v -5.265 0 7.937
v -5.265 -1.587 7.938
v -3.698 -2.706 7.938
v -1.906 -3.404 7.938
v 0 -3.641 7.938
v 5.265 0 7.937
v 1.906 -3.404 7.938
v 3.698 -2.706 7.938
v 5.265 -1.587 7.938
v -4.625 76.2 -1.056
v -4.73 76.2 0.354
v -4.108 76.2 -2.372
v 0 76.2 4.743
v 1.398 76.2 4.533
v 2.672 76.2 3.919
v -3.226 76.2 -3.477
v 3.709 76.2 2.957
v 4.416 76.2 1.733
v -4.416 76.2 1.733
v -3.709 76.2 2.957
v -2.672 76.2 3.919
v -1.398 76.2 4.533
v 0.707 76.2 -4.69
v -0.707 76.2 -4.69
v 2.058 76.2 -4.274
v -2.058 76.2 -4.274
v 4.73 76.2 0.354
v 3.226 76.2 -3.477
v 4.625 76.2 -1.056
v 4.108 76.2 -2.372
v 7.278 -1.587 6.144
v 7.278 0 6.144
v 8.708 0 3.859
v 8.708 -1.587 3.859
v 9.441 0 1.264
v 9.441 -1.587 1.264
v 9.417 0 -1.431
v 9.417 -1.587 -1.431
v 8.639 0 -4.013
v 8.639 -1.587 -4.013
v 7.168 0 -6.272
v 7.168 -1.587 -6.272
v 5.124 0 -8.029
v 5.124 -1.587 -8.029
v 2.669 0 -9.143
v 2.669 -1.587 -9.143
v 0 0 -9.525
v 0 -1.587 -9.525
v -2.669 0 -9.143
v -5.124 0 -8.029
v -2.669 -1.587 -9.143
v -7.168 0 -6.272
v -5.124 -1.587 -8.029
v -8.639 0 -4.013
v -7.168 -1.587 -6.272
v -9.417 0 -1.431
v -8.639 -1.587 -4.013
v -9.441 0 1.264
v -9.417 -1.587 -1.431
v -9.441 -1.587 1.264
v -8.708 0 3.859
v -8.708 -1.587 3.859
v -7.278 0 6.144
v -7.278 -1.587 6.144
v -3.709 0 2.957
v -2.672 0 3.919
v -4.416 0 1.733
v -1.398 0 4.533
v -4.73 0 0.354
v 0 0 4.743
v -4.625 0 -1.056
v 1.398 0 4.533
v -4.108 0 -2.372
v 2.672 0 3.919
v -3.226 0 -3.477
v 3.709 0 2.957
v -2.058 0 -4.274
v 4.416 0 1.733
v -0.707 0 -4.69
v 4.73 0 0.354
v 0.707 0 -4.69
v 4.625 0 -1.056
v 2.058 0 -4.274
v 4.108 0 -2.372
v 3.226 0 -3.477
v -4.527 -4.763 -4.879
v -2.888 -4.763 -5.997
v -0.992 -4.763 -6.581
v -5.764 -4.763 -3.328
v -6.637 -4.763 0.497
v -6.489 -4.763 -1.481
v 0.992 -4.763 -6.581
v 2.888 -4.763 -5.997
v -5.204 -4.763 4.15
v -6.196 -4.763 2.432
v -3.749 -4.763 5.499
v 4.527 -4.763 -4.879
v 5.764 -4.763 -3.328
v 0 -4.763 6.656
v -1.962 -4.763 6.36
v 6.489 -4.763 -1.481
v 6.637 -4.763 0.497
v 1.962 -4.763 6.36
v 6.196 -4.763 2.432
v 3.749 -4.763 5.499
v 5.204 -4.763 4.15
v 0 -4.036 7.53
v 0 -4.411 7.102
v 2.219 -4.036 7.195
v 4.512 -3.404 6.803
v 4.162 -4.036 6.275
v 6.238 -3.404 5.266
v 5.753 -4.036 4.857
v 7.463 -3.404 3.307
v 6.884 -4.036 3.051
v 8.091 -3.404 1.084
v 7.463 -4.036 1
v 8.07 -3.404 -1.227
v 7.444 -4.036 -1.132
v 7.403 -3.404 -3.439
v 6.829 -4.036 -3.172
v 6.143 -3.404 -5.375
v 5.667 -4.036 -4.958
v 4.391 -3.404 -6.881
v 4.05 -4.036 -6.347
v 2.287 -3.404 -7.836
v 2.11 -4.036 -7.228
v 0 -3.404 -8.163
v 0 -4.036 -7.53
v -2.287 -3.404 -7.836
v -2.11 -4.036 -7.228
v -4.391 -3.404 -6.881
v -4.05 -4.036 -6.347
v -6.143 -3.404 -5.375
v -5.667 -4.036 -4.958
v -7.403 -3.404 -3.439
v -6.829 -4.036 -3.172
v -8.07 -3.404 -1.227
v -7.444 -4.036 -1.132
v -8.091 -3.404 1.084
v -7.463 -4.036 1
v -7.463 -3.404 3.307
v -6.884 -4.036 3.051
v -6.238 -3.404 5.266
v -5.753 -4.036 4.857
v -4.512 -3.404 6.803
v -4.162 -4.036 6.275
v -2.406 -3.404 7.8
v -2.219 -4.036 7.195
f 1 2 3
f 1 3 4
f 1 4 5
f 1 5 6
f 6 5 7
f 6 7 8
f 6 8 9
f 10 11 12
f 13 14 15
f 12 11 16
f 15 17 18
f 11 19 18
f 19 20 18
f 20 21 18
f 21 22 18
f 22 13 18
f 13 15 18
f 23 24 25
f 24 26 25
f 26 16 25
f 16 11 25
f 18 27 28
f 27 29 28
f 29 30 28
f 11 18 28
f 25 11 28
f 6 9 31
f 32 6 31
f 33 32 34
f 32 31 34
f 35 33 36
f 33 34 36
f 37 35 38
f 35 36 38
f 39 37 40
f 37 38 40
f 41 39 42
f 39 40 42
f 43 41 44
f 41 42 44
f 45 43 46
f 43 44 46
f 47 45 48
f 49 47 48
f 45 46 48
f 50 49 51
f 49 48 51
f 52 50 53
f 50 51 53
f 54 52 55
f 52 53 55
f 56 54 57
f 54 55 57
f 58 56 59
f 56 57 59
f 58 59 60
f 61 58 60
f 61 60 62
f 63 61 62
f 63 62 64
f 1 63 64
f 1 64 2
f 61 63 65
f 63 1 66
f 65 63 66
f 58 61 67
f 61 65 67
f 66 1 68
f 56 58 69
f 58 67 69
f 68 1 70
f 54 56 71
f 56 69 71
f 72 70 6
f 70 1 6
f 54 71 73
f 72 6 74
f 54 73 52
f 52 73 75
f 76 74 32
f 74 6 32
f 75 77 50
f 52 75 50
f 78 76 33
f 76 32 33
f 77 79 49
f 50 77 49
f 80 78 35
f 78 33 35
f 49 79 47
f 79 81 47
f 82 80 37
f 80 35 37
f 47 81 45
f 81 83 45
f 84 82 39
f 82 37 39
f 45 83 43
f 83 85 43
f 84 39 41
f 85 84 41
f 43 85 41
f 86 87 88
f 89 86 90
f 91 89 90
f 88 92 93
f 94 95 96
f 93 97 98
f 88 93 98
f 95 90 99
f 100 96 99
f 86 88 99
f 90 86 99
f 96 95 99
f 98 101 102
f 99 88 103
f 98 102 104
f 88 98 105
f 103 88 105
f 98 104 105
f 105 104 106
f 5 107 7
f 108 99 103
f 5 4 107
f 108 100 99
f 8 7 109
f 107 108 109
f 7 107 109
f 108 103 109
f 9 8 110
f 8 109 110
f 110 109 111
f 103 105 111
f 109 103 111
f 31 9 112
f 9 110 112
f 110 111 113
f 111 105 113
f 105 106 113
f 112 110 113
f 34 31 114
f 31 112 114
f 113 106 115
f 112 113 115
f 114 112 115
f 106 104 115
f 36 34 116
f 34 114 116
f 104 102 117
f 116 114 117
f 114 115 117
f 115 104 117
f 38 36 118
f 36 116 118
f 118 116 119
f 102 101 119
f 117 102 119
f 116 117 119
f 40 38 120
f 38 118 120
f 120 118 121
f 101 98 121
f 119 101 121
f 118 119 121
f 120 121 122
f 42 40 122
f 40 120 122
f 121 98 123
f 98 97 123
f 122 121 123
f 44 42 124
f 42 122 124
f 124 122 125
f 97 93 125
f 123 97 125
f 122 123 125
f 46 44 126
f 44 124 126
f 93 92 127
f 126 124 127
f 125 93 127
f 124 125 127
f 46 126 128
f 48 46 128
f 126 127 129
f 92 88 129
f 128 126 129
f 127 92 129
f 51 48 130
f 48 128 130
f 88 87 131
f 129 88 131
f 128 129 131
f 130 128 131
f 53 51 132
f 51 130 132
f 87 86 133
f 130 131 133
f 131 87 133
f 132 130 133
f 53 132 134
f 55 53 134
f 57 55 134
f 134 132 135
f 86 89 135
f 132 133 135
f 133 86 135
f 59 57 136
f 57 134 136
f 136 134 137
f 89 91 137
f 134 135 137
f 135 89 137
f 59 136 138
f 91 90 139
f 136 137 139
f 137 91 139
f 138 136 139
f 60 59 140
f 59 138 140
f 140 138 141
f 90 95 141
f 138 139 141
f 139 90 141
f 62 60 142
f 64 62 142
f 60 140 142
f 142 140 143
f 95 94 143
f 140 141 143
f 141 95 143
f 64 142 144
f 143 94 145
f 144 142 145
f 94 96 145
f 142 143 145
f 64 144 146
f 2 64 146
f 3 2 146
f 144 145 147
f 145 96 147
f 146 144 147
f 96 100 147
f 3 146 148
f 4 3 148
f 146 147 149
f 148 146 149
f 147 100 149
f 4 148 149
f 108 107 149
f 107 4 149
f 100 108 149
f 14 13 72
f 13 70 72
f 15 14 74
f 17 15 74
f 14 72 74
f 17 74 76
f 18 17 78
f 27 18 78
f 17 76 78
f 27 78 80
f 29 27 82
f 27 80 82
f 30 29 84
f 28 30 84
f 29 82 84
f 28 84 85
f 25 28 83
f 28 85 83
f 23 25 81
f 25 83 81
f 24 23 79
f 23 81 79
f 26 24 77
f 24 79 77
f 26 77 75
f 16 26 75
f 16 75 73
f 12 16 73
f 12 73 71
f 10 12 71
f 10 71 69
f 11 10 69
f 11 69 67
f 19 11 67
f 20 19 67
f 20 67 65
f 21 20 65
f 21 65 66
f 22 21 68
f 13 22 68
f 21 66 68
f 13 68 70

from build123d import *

# Parameters (mm, degrees)
F3_DEPTH = 4.7625


with BuildPart() as f1:
    # F0 (on Right) → F1 (revolve)
    with BuildSketch(Plane.YZ):
        with BuildLine():
            Line((-1.5875, 0), (0, 0))
            Line((0, 0), (76.2, 0))
            Line((76.2, 0), (76.2, 4.74345))
            Line((76.2, 4.74345), (0, 4.74345))
            Line((0, 4.74345), (0, 9.525))
            Line((0, 9.525), (-1.5875, 9.525))
            ThreePointArc((-1.5875, 9.525), (-3.314423, 8.244646), (-4.7625, 6.655734))
            Line((-4.7625, 6.655734), (-4.7625, 0))
            Line((-4.7625, 0), (-1.5875, 0))
        make_face()
    revolve(axis=Axis((0, 38.1, 0), (0, 1, 0)))

    # F2 (on face) → F3 (cut)
    with BuildSketch(Plane.XZ.offset(4.7625)):
        with BuildLine():
            ThreePointArc((5.299691, 7.9375), (0, 9.544141), (-5.299691, 7.9375))
            Line((-5.299691, 7.9375), (5.299691, 7.9375))
        make_face()
    extrude(amount=-F3_DEPTH, mode=Mode.SUBTRACT)


solid = f1.part
